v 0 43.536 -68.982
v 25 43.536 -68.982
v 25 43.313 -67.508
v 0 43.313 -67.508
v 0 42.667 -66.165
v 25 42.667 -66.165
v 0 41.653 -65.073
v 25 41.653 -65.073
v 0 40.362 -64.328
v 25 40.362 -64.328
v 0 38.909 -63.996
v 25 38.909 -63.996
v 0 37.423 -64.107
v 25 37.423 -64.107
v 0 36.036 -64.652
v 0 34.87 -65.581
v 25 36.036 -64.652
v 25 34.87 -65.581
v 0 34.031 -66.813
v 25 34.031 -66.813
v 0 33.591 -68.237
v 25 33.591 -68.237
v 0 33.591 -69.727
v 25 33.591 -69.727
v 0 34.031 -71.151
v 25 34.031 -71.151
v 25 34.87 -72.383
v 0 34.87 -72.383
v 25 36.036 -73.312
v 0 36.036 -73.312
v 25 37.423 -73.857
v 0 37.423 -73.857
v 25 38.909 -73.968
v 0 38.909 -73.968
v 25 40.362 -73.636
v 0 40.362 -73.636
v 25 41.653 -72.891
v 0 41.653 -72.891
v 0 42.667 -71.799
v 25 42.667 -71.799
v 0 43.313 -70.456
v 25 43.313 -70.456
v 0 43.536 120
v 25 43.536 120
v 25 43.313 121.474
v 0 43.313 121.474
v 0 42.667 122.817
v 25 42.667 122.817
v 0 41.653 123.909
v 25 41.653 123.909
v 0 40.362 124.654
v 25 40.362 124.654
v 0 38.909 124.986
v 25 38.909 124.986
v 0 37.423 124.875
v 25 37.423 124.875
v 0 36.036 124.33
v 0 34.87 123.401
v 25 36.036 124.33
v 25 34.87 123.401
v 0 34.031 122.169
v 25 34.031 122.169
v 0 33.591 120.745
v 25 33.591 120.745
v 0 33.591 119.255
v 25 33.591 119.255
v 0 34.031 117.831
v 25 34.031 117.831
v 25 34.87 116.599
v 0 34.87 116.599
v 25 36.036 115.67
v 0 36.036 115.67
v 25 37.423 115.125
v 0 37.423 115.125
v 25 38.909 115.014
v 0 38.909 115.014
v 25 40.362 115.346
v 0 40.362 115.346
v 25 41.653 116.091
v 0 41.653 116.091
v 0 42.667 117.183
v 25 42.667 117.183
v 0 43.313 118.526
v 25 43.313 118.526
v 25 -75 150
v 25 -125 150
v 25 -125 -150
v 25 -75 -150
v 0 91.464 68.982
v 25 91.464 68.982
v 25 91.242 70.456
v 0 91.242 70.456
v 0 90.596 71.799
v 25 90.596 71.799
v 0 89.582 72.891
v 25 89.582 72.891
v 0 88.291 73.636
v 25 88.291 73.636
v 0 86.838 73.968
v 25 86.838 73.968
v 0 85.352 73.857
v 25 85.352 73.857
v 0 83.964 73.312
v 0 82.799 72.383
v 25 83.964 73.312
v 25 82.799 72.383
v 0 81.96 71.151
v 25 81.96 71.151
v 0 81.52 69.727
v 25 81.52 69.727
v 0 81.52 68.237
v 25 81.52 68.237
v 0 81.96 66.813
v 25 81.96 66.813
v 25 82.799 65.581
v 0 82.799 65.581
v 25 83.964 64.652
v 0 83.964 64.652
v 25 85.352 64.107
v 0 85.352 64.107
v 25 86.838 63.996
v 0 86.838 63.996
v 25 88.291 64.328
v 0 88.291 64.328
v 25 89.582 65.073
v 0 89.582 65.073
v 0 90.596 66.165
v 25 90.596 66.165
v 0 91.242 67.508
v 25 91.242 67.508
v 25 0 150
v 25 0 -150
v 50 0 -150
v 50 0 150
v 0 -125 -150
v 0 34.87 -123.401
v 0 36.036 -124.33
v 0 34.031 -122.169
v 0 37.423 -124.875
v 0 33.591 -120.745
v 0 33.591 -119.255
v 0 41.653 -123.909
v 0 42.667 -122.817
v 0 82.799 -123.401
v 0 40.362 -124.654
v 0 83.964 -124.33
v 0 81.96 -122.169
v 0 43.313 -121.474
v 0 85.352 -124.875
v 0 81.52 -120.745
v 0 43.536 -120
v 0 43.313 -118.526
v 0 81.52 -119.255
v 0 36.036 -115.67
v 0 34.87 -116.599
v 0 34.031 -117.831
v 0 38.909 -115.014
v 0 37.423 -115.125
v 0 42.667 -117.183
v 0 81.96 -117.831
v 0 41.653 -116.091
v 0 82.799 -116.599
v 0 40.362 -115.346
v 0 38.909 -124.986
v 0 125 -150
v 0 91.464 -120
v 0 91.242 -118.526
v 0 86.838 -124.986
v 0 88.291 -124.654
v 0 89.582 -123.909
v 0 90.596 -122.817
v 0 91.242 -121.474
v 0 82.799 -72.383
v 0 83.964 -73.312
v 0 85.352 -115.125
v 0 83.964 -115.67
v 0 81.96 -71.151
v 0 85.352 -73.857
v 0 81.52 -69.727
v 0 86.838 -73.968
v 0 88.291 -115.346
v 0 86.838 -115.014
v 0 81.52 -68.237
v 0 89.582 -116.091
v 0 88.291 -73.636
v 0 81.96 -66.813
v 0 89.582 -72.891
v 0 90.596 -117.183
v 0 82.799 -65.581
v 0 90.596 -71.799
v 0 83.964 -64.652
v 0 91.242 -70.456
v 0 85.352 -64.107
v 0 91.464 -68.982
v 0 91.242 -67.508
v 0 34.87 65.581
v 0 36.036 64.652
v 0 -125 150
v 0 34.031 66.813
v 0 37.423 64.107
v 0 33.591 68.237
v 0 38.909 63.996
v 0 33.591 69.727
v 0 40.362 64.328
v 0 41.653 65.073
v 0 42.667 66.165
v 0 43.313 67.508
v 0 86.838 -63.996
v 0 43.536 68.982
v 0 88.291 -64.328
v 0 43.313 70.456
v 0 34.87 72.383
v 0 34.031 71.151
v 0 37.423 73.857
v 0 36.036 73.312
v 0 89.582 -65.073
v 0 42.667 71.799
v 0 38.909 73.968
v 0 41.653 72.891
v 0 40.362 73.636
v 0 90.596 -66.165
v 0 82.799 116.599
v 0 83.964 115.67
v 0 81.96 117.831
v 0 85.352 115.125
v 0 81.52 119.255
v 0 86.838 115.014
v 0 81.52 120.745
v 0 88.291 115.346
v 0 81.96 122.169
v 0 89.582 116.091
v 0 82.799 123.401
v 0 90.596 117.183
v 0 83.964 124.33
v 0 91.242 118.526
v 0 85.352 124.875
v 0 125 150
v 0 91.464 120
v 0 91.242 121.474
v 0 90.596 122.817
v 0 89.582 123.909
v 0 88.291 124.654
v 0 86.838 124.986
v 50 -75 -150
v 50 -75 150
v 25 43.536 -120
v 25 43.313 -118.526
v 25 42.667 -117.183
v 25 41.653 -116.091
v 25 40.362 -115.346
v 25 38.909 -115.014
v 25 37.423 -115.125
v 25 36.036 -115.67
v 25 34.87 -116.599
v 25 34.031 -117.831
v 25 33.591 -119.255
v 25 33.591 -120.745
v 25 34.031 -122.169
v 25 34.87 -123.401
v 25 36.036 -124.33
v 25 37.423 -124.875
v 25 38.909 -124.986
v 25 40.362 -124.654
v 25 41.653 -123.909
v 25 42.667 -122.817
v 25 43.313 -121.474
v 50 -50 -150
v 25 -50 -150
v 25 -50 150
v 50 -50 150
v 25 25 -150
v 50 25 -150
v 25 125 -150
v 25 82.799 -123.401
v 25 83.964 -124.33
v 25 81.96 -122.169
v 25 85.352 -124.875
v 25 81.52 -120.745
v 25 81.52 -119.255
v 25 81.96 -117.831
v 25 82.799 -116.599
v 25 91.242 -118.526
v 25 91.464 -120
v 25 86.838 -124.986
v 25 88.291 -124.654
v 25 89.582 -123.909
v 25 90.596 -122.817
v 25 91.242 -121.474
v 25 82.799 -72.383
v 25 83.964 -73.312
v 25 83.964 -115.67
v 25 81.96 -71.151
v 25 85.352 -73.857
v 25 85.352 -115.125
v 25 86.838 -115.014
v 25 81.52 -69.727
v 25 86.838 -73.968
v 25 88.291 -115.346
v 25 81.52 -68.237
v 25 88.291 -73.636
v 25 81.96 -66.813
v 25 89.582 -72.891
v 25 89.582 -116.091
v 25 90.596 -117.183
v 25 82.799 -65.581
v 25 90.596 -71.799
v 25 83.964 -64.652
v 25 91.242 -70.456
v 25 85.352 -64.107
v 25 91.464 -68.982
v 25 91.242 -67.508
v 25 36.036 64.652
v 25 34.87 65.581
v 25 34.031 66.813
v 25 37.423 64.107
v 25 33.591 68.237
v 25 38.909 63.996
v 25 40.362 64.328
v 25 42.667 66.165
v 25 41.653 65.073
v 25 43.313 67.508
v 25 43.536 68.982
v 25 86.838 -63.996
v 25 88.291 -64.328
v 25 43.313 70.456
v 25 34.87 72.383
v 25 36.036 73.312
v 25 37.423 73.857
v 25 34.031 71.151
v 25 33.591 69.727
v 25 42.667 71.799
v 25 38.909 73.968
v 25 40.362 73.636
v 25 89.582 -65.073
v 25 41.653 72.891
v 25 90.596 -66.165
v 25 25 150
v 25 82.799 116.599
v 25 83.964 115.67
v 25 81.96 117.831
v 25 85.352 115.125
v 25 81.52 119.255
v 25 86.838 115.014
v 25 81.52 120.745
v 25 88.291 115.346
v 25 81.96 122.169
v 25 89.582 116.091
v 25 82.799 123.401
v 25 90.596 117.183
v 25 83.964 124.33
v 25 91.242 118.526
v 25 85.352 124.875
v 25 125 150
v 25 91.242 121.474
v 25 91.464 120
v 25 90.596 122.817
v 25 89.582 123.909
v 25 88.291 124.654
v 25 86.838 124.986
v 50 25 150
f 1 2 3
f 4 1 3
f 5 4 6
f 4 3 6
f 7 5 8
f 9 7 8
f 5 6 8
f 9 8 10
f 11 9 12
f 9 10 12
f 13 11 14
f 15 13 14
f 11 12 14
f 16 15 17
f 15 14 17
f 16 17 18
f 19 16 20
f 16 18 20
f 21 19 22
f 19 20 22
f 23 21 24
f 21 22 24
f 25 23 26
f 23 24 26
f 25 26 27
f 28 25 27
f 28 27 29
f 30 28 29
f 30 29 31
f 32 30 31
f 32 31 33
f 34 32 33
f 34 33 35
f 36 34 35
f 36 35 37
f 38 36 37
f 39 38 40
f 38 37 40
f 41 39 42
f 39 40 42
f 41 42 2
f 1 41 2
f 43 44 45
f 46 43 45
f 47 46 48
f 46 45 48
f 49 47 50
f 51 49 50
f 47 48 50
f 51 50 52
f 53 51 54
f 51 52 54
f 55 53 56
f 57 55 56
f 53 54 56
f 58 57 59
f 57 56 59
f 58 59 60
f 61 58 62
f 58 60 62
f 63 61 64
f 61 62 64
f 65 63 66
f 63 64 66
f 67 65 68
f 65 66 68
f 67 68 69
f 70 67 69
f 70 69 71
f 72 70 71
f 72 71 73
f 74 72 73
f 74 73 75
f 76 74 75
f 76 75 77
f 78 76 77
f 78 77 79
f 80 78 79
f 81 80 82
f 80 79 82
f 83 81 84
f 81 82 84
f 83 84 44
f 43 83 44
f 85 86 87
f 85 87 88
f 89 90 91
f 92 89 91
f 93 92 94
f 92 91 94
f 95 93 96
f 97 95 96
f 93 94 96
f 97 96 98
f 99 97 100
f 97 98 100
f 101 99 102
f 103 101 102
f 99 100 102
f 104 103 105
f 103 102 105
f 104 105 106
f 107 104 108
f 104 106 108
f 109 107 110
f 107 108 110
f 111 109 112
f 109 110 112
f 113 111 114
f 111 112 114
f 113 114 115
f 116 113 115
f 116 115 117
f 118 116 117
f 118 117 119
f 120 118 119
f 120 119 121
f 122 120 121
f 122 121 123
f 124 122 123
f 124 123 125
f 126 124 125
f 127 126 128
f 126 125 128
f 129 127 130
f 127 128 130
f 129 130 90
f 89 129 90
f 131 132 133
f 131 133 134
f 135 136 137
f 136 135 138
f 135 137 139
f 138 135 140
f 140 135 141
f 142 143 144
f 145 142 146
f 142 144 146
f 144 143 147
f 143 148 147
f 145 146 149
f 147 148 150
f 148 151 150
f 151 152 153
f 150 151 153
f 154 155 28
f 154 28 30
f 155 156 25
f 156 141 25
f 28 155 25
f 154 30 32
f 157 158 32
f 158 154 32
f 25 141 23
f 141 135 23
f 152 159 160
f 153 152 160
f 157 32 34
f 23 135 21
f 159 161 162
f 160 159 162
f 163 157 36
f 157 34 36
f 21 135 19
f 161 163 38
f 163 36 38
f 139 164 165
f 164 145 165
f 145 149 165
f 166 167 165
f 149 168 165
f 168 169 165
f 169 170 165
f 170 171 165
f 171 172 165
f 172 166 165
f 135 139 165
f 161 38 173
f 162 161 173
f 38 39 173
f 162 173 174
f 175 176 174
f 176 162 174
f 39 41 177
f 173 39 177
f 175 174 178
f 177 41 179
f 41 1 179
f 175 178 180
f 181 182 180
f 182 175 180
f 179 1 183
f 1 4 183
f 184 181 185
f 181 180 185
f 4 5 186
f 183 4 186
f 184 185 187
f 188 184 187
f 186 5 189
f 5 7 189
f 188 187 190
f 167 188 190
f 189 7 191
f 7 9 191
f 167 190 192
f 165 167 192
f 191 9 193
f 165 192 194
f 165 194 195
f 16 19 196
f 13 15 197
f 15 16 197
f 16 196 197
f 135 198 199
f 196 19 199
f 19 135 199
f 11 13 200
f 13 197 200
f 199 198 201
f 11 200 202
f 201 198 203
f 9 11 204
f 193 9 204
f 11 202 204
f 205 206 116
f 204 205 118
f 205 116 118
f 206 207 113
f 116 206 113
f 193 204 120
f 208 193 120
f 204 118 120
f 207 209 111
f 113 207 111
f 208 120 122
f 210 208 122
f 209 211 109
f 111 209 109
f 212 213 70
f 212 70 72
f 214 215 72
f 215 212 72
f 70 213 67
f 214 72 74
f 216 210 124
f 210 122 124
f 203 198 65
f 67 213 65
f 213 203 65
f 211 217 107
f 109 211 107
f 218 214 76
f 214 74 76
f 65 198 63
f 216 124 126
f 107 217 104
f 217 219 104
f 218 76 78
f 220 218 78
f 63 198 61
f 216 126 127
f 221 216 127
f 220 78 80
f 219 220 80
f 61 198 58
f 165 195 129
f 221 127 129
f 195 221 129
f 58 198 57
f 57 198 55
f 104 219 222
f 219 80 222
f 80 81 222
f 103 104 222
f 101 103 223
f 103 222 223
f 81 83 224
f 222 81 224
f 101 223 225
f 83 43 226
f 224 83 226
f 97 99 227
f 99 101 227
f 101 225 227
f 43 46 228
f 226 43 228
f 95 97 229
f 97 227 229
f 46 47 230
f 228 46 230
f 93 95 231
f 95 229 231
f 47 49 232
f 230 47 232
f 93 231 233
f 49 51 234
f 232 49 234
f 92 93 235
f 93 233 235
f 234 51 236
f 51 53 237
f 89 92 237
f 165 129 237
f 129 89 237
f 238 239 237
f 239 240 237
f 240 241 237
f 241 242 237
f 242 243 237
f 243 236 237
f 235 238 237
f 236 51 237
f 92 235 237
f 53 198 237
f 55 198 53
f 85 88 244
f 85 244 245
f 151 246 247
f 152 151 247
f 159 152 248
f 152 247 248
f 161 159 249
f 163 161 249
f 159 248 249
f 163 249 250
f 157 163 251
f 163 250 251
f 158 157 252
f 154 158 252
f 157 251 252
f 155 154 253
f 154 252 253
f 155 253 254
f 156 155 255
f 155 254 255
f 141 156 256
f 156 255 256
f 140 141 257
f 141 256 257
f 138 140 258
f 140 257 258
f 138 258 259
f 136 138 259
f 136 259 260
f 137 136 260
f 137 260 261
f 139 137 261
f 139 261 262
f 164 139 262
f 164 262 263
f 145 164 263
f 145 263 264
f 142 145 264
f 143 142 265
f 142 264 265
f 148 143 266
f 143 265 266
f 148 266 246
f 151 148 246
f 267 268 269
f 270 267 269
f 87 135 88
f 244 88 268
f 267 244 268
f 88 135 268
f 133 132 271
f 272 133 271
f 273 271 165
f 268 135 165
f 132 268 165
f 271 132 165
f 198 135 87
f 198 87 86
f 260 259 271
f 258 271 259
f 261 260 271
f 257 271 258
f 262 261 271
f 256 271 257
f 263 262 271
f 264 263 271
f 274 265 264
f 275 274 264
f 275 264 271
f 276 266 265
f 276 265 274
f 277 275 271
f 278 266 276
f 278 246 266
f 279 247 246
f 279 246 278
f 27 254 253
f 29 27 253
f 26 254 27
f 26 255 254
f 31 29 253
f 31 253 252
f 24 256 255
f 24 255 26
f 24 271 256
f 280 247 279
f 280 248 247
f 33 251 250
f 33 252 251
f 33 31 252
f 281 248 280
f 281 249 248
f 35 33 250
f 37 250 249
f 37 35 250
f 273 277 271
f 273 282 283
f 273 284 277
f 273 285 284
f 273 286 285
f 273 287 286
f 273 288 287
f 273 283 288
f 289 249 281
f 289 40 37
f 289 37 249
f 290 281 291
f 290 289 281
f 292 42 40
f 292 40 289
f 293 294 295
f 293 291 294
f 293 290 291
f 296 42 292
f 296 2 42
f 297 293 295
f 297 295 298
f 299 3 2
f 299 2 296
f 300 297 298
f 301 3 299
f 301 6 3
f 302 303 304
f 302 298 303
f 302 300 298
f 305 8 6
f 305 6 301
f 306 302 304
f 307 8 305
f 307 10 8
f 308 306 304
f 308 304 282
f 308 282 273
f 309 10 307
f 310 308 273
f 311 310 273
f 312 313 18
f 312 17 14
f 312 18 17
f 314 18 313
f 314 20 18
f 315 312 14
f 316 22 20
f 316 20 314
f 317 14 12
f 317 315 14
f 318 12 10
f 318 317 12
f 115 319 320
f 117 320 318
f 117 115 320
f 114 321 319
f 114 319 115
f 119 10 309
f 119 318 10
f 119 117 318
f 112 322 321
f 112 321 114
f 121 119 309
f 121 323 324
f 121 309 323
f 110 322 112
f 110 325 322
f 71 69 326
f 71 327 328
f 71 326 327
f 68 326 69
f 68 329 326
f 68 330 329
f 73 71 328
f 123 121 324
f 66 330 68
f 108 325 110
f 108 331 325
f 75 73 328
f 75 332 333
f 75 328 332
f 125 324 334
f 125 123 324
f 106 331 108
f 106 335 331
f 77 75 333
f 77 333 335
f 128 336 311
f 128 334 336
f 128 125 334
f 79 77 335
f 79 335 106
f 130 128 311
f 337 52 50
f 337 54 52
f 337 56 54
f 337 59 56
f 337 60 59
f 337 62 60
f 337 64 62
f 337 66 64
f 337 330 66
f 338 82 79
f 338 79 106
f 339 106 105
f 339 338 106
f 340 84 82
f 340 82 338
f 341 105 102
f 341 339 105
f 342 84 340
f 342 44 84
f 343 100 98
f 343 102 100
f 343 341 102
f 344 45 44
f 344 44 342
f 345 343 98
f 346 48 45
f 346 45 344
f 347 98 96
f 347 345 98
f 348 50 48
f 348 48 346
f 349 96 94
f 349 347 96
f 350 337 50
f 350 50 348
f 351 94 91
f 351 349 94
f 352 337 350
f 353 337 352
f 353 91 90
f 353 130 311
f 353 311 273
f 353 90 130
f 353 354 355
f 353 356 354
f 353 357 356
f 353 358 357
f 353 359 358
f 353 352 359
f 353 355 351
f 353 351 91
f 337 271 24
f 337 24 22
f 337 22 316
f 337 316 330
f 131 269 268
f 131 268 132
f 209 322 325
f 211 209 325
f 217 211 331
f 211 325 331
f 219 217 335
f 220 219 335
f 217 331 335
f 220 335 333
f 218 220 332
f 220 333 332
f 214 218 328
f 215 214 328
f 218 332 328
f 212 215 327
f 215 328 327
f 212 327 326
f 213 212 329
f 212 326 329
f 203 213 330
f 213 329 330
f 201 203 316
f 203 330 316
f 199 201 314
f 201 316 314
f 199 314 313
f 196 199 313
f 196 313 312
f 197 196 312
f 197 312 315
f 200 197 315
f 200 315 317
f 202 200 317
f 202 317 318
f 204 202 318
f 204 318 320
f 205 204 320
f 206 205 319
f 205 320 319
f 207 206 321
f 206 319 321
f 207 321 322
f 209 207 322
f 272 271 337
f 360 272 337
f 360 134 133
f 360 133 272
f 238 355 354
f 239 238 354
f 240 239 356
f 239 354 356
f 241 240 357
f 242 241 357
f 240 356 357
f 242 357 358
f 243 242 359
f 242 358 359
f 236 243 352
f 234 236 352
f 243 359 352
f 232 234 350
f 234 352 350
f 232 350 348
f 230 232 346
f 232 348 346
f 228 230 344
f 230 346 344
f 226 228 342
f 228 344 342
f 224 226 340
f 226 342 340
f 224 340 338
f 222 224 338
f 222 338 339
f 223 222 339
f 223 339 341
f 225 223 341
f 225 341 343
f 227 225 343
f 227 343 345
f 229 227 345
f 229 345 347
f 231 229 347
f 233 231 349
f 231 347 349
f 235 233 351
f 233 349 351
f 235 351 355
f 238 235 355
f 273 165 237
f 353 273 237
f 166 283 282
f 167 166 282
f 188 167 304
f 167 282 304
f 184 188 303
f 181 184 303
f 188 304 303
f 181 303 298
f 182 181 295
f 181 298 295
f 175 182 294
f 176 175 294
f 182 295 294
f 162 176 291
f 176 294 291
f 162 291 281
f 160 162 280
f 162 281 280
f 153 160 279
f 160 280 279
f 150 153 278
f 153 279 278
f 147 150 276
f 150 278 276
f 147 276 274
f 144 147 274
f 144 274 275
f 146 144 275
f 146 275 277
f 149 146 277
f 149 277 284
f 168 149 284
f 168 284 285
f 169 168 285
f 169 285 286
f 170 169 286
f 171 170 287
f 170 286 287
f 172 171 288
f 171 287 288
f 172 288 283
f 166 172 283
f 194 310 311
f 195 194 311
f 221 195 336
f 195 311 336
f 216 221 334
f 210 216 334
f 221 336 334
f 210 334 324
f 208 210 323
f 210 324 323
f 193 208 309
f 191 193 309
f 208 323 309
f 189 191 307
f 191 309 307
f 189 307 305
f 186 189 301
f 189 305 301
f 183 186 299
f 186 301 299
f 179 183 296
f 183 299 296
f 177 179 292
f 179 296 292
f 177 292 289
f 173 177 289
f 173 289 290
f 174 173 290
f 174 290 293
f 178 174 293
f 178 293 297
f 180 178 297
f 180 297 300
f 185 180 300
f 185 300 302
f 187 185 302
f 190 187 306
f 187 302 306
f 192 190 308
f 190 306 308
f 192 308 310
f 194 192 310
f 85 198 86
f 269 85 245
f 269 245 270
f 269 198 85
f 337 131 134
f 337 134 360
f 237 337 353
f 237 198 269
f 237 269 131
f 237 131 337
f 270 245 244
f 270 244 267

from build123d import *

# Parameters (mm, degrees)
F0_W     = 250
F0_H     = 300
F1_DEPTH = 25
F2_W     = 25
F2_H     = 300
F3_DEPTH = 25
F4_R     = 5
F5_DEPTH = 25


with BuildPart() as f1:
    # F0 (on Right) → F1 (new body)
    with BuildSketch(Plane.YZ):
        Rectangle(F0_W, F0_H)
    extrude(amount=F1_DEPTH)

    # F2 (on face) → F3 (join)
    with BuildSketch(Plane.YZ.offset(25)):
        with Locations((-62.5, 0)):
            Rectangle(F2_W, F2_H)
        with Locations((12.5, 0)):
            Rectangle(F2_W, F2_H)
    extrude(amount=F3_DEPTH)

    # F4 (on face) → F5 (cut, through all)
    with BuildSketch(Plane.YZ.offset(25)):
        with Locations((86.464388, 120)):
            Circle(F4_R)
        with Locations((38.535612, 68.982038)):
            Circle(F4_R)
        with Locations((38.535612, 120)):
            Circle(F4_R)
        with Locations((86.464388, 68.982038)):
            Circle(F4_R)
        with Locations((86.464388, -68.982038)):
            Circle(F4_R)
        with Locations((86.464388, -120)):
            Circle(F4_R)
        with Locations((38.535612, -120)):
            Circle(F4_R)
        with Locations((38.535612, -68.982038)):
            Circle(F4_R)
    extrude(amount=-F5_DEPTH, mode=Mode.SUBTRACT)


solid = f1.part
